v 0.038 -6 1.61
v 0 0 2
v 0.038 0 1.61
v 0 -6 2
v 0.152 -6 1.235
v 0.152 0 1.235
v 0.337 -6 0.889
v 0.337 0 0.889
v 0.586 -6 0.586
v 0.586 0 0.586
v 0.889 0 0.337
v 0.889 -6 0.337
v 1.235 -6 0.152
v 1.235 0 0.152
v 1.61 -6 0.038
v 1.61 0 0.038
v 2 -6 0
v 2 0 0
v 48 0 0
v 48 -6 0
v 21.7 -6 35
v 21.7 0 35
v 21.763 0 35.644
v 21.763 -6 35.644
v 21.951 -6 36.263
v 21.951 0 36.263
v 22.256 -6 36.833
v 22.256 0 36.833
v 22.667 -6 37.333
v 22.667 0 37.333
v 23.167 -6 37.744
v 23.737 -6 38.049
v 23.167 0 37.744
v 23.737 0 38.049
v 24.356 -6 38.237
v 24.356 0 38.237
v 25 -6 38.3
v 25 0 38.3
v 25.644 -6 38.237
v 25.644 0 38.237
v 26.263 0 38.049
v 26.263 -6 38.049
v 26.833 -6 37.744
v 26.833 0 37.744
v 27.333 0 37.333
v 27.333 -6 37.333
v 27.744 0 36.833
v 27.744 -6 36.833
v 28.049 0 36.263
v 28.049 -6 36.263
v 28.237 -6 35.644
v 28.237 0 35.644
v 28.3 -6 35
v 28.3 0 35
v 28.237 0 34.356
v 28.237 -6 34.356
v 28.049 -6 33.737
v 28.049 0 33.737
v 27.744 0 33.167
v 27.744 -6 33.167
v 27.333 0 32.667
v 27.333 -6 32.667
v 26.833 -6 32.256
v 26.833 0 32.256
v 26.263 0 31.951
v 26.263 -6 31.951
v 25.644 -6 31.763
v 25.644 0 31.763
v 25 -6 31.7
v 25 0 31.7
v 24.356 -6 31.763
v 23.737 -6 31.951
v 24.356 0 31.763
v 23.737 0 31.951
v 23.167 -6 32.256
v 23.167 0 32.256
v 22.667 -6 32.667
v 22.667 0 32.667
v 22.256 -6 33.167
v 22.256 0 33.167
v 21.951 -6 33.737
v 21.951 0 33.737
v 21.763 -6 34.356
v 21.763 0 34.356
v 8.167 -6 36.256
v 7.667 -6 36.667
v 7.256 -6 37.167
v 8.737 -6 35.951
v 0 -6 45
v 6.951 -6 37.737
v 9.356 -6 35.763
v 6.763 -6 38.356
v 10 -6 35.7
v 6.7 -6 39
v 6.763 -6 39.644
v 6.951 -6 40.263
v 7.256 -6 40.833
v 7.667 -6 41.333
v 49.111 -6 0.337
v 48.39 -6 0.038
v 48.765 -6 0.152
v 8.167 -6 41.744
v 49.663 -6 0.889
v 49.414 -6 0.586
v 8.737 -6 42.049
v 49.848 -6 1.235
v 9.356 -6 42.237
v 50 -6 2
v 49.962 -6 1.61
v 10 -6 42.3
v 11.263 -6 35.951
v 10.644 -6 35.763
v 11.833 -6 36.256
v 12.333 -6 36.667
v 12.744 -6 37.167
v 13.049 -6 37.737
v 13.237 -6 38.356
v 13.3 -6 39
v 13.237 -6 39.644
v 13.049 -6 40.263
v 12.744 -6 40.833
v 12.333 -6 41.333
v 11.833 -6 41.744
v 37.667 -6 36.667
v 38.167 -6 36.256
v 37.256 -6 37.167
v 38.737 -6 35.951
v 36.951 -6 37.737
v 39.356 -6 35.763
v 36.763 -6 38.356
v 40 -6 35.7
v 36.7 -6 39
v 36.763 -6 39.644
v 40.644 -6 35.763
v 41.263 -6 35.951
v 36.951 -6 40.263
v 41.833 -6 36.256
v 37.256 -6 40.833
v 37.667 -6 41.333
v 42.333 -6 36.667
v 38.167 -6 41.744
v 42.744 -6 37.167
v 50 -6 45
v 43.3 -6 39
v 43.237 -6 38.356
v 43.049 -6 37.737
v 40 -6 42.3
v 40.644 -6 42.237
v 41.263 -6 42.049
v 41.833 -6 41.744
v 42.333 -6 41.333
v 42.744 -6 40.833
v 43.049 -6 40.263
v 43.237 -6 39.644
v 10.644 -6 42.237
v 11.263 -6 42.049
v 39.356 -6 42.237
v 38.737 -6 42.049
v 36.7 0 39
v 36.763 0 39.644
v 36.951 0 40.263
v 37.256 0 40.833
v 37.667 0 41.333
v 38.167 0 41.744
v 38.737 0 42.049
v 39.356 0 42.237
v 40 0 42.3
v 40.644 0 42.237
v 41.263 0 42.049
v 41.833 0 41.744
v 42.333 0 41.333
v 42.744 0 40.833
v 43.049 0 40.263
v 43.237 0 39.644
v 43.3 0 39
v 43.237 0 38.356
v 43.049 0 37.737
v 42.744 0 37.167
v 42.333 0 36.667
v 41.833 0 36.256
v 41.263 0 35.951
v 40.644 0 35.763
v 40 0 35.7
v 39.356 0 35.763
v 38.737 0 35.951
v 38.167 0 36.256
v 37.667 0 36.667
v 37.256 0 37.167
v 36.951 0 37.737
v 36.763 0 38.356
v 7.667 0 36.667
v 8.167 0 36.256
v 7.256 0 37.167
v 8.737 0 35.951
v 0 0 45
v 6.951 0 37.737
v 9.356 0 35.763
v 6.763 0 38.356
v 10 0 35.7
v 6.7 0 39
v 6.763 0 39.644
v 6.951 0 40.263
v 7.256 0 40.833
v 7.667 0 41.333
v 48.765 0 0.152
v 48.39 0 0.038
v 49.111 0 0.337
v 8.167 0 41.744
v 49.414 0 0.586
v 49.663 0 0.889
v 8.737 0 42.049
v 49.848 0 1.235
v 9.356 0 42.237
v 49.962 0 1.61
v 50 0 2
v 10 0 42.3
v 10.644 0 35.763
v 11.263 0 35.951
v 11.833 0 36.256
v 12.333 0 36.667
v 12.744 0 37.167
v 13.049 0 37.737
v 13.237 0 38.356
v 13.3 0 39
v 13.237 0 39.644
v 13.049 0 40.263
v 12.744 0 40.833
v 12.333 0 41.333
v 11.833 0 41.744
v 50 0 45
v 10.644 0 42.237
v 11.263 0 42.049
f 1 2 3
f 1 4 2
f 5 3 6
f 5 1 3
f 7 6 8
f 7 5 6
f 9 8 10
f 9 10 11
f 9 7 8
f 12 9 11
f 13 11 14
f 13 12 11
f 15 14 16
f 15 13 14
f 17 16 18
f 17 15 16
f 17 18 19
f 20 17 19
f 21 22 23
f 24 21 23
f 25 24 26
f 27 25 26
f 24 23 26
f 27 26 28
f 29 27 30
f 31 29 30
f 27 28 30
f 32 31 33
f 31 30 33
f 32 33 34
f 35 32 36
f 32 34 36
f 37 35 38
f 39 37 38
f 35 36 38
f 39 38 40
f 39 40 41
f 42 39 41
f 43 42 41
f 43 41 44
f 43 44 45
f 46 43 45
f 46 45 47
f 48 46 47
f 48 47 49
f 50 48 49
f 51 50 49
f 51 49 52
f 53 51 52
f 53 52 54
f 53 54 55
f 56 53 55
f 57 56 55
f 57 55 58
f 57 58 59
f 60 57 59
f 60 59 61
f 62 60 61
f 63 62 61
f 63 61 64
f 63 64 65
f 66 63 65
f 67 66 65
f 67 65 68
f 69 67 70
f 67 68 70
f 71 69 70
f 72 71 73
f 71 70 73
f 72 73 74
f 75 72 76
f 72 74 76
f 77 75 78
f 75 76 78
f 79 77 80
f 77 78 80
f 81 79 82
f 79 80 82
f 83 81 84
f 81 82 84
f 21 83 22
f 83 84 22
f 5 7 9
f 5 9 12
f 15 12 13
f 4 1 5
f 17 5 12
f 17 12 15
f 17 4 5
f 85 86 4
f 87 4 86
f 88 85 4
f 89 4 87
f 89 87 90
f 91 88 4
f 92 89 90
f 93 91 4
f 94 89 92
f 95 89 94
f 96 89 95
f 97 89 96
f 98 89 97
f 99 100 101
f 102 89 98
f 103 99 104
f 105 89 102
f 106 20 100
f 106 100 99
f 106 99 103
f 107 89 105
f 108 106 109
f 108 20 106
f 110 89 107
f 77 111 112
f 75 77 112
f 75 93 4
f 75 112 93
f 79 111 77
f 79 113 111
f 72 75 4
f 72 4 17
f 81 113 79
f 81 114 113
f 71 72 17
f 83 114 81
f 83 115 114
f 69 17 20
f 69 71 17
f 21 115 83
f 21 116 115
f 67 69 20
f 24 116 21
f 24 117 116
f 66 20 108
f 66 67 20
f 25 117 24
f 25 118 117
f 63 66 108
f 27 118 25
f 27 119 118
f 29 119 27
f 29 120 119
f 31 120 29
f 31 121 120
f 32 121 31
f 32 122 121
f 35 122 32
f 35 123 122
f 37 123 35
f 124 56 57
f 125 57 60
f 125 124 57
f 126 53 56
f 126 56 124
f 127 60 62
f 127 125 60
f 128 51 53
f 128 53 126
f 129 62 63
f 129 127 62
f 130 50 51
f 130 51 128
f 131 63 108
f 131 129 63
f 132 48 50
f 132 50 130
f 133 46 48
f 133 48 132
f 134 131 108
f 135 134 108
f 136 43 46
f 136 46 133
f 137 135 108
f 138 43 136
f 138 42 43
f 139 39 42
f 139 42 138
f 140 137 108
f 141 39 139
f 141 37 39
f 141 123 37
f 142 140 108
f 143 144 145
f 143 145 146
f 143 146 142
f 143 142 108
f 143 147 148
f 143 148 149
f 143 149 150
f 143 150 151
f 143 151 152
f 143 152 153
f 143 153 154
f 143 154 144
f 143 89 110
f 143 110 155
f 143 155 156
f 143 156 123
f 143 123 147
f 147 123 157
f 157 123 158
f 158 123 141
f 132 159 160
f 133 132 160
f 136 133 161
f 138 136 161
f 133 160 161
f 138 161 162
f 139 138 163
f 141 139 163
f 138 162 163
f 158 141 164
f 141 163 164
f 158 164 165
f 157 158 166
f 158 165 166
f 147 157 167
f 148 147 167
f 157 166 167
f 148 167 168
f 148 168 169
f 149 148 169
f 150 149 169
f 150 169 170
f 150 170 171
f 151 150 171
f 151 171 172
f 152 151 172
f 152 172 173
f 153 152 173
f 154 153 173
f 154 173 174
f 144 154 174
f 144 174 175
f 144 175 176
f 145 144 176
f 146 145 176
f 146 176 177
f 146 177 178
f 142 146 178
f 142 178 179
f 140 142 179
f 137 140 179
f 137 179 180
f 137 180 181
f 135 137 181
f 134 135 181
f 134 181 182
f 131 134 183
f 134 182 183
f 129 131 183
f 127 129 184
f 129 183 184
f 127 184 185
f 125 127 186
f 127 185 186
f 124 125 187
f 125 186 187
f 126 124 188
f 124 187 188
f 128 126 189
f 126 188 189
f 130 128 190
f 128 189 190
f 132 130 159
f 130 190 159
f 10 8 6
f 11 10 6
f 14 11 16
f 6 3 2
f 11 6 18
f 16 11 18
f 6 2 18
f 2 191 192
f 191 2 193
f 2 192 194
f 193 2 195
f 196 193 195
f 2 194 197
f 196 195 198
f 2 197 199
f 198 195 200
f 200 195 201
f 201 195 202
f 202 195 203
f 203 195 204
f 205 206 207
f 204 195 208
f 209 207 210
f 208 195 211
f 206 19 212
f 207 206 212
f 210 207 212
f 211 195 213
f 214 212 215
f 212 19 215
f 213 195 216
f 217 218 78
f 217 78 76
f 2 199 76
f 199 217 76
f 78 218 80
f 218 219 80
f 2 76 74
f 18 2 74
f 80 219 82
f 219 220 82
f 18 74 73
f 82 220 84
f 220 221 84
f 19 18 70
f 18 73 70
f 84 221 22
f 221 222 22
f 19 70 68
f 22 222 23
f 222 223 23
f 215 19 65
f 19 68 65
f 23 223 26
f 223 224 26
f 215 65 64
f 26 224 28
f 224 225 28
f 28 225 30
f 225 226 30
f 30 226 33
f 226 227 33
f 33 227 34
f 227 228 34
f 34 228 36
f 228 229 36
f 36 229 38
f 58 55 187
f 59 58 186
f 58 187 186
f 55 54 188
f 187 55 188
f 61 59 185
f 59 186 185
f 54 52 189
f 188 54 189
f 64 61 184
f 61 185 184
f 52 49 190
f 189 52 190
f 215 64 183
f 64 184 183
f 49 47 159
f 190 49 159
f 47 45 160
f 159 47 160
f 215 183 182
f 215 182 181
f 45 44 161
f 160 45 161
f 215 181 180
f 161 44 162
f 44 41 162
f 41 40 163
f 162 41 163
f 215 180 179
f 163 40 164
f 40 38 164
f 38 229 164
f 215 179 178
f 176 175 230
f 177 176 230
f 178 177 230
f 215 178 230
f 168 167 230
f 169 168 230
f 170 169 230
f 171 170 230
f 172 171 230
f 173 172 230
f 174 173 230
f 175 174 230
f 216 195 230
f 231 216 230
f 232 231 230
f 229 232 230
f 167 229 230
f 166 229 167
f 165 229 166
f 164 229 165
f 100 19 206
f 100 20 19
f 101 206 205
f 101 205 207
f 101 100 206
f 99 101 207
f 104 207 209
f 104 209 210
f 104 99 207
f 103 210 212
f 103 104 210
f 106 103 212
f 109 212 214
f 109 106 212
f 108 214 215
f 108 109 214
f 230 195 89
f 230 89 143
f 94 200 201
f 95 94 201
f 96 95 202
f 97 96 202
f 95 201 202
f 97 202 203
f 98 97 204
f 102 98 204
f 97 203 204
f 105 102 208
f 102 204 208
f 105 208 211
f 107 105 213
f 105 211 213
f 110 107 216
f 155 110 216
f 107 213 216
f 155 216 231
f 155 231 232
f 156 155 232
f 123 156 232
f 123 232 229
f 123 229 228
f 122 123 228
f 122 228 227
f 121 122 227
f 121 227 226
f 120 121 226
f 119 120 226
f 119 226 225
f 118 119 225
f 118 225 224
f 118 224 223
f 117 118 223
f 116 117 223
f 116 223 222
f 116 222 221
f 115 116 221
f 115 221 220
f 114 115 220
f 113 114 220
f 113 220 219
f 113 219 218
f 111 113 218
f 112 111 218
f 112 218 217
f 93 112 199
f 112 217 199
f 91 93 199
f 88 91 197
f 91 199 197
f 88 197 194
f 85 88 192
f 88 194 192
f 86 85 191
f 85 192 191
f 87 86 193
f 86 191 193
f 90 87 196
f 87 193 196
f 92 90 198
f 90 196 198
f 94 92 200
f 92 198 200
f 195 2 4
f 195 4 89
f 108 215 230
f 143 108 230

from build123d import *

# Parameters (mm, degrees)
F0_W     = 50
F0_H     = 45
F1_DEPTH = 6
F3_D     = 6.6
F4_R     = 2


with BuildPart() as f1:
    # F0 (on Front) → F1 (new body)
    with BuildSketch(Plane.XZ):
        with Locations((25, 22.5)):
            Rectangle(F0_W, F0_H)
    extrude(amount=F1_DEPTH)

    # F3 (through all)
    with Locations(Plane.XZ.offset(6)):
        with Locations((10, 39), (25, 35), (40, 39)):
            Hole(F3_D / 2)

    # F4
    f4_edges = [f1.edges().sort_by_distance(p)[0] for p in [
        (50, -3, 0),
        (0, -3, 0),
    ]]
    fillet(f4_edges, radius=F4_R)


solid = f1.part
